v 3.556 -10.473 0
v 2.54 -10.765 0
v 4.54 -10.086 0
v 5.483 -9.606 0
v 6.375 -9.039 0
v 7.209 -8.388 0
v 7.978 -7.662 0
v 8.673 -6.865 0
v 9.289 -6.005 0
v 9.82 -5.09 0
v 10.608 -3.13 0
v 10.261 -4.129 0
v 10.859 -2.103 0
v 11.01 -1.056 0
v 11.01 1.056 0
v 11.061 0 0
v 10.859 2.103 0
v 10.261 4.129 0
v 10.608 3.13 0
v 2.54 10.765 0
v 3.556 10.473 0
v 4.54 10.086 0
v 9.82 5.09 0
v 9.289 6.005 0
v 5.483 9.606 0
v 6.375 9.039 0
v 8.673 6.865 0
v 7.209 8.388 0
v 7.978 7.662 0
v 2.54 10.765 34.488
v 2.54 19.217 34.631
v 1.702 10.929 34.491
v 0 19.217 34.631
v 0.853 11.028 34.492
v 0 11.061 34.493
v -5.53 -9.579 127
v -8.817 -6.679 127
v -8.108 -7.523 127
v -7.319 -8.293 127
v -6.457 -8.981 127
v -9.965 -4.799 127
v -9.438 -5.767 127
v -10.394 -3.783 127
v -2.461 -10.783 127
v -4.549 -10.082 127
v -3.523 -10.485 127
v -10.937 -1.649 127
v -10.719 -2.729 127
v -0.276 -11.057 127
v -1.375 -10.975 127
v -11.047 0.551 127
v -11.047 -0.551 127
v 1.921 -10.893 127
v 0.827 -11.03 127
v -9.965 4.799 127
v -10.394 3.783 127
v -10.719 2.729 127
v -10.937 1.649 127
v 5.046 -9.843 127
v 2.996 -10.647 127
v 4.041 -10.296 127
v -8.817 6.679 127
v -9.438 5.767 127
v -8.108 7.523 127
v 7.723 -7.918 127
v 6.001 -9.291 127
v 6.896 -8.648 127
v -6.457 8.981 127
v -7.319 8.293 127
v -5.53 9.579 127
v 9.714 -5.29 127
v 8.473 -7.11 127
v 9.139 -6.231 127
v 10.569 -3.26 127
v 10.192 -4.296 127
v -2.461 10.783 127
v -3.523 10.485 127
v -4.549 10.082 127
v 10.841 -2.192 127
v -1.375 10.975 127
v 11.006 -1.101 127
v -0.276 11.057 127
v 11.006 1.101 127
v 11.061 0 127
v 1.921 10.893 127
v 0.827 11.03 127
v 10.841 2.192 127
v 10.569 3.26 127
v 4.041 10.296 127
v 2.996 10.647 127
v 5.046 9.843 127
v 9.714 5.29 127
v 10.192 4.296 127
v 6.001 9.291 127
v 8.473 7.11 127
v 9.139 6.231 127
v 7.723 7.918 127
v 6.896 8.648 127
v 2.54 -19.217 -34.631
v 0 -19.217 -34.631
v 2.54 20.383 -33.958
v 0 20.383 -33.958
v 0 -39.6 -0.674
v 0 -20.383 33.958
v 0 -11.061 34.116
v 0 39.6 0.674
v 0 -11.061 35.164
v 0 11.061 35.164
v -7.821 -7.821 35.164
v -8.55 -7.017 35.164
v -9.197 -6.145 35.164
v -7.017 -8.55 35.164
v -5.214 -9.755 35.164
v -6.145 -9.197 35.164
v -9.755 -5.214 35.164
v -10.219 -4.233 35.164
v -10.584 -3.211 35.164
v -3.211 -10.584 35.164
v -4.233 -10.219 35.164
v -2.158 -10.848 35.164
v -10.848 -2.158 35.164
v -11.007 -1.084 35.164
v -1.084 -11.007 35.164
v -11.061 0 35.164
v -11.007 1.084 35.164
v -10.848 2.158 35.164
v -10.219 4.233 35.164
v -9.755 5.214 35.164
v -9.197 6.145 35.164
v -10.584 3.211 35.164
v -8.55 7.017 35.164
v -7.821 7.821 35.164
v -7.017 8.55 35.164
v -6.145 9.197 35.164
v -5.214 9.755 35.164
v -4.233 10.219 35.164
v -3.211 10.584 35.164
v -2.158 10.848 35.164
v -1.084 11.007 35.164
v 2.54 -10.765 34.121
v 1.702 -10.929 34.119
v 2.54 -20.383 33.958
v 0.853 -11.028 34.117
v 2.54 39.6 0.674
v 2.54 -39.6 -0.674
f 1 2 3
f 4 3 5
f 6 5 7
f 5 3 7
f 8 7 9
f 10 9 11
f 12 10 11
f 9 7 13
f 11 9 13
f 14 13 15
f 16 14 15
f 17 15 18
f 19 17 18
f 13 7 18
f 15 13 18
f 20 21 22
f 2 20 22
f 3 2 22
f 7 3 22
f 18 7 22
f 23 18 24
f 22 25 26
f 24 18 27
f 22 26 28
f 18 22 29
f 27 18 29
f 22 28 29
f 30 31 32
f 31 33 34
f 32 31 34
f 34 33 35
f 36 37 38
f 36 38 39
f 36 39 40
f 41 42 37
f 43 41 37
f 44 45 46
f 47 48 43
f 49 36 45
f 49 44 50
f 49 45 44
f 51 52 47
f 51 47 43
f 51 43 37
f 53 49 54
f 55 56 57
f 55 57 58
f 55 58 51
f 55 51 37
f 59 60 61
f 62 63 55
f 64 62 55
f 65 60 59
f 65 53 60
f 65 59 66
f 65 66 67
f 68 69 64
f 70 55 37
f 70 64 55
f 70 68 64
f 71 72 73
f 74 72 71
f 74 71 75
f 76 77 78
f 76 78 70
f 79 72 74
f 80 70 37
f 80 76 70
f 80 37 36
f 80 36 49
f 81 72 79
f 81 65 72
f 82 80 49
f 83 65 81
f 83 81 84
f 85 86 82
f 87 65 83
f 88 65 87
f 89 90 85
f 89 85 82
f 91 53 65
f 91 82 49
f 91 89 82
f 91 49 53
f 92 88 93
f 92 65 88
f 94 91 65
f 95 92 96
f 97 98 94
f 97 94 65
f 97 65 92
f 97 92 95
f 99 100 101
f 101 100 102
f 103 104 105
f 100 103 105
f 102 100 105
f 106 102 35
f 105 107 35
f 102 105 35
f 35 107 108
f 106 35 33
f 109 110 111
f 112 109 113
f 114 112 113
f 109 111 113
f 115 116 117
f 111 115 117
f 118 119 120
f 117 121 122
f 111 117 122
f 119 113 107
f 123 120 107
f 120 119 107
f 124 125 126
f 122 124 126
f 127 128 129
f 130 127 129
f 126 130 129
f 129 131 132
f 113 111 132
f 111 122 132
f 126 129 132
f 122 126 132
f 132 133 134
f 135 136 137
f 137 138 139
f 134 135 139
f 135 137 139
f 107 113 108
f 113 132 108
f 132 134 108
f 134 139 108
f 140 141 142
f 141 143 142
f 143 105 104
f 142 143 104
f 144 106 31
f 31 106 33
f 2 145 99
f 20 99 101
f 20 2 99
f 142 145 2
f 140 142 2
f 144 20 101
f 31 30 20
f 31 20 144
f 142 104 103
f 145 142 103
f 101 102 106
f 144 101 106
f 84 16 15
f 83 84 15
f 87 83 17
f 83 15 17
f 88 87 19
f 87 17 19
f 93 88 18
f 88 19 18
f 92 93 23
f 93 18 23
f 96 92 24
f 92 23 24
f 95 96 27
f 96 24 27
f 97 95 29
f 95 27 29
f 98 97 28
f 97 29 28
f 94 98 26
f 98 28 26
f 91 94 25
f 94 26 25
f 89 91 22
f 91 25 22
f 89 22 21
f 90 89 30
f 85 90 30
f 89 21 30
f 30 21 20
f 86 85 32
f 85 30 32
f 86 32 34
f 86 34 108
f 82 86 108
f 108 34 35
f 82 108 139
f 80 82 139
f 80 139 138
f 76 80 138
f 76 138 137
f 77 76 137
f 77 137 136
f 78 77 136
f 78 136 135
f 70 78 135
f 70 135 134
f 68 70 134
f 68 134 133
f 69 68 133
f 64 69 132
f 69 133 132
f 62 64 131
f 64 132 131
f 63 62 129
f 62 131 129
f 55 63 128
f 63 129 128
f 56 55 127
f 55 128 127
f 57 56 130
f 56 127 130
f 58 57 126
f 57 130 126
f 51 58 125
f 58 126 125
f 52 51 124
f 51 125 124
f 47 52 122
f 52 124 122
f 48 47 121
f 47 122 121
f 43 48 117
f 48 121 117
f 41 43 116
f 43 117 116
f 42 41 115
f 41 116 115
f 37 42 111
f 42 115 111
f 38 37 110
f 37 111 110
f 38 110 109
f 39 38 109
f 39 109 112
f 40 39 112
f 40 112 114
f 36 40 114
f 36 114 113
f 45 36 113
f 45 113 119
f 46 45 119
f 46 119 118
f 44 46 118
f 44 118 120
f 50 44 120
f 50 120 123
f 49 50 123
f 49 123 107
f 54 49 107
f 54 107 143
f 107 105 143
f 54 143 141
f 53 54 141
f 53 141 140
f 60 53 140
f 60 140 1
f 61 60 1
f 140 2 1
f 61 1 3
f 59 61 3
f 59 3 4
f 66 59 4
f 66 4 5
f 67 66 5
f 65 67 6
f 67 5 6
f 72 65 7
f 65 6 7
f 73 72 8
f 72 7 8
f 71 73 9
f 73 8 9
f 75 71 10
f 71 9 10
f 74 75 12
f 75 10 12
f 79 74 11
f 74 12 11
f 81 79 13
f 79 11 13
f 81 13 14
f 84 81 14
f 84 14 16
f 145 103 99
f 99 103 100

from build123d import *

# Parameters (mm, degrees)
F0_R          = 11.060744
F1_DEPTH      = 127
F3_DEPTH      = 2.54
F4_W          = 12.080216
F4_H          = 35.164498
F5_DEPTH      = 39.601066
F5_DEPTH_BACK = 25.4


with BuildPart() as f1:
    # F0 (on Top) → F1 (new body)
    with BuildSketch(Plane.XY):
        Circle(F0_R)
    extrude(amount=F1_DEPTH)

    # F2 (on Right) → F3 (join)
    with BuildSketch(Plane.YZ):
        Polygon((20.383448, -33.957828), (39.600066, 0.67367), (19.216617, 34.631498), (-20.383448, 33.957828), (-39.600066, -0.67367), (-19.216617, -34.631498), align=None)
    extrude(amount=F3_DEPTH)

    # F4 (on Front) → F5 (cut, two sides)
    with BuildSketch(Plane.XZ) as f5_sk:
        with Locations((-6.040108, 17.582249)):
            Rectangle(F4_W, F4_H)
    extrude(amount=F5_DEPTH, mode=Mode.SUBTRACT)
    extrude(f5_sk.sketch, amount=-F5_DEPTH_BACK, mode=Mode.SUBTRACT)


solid = f1.part
